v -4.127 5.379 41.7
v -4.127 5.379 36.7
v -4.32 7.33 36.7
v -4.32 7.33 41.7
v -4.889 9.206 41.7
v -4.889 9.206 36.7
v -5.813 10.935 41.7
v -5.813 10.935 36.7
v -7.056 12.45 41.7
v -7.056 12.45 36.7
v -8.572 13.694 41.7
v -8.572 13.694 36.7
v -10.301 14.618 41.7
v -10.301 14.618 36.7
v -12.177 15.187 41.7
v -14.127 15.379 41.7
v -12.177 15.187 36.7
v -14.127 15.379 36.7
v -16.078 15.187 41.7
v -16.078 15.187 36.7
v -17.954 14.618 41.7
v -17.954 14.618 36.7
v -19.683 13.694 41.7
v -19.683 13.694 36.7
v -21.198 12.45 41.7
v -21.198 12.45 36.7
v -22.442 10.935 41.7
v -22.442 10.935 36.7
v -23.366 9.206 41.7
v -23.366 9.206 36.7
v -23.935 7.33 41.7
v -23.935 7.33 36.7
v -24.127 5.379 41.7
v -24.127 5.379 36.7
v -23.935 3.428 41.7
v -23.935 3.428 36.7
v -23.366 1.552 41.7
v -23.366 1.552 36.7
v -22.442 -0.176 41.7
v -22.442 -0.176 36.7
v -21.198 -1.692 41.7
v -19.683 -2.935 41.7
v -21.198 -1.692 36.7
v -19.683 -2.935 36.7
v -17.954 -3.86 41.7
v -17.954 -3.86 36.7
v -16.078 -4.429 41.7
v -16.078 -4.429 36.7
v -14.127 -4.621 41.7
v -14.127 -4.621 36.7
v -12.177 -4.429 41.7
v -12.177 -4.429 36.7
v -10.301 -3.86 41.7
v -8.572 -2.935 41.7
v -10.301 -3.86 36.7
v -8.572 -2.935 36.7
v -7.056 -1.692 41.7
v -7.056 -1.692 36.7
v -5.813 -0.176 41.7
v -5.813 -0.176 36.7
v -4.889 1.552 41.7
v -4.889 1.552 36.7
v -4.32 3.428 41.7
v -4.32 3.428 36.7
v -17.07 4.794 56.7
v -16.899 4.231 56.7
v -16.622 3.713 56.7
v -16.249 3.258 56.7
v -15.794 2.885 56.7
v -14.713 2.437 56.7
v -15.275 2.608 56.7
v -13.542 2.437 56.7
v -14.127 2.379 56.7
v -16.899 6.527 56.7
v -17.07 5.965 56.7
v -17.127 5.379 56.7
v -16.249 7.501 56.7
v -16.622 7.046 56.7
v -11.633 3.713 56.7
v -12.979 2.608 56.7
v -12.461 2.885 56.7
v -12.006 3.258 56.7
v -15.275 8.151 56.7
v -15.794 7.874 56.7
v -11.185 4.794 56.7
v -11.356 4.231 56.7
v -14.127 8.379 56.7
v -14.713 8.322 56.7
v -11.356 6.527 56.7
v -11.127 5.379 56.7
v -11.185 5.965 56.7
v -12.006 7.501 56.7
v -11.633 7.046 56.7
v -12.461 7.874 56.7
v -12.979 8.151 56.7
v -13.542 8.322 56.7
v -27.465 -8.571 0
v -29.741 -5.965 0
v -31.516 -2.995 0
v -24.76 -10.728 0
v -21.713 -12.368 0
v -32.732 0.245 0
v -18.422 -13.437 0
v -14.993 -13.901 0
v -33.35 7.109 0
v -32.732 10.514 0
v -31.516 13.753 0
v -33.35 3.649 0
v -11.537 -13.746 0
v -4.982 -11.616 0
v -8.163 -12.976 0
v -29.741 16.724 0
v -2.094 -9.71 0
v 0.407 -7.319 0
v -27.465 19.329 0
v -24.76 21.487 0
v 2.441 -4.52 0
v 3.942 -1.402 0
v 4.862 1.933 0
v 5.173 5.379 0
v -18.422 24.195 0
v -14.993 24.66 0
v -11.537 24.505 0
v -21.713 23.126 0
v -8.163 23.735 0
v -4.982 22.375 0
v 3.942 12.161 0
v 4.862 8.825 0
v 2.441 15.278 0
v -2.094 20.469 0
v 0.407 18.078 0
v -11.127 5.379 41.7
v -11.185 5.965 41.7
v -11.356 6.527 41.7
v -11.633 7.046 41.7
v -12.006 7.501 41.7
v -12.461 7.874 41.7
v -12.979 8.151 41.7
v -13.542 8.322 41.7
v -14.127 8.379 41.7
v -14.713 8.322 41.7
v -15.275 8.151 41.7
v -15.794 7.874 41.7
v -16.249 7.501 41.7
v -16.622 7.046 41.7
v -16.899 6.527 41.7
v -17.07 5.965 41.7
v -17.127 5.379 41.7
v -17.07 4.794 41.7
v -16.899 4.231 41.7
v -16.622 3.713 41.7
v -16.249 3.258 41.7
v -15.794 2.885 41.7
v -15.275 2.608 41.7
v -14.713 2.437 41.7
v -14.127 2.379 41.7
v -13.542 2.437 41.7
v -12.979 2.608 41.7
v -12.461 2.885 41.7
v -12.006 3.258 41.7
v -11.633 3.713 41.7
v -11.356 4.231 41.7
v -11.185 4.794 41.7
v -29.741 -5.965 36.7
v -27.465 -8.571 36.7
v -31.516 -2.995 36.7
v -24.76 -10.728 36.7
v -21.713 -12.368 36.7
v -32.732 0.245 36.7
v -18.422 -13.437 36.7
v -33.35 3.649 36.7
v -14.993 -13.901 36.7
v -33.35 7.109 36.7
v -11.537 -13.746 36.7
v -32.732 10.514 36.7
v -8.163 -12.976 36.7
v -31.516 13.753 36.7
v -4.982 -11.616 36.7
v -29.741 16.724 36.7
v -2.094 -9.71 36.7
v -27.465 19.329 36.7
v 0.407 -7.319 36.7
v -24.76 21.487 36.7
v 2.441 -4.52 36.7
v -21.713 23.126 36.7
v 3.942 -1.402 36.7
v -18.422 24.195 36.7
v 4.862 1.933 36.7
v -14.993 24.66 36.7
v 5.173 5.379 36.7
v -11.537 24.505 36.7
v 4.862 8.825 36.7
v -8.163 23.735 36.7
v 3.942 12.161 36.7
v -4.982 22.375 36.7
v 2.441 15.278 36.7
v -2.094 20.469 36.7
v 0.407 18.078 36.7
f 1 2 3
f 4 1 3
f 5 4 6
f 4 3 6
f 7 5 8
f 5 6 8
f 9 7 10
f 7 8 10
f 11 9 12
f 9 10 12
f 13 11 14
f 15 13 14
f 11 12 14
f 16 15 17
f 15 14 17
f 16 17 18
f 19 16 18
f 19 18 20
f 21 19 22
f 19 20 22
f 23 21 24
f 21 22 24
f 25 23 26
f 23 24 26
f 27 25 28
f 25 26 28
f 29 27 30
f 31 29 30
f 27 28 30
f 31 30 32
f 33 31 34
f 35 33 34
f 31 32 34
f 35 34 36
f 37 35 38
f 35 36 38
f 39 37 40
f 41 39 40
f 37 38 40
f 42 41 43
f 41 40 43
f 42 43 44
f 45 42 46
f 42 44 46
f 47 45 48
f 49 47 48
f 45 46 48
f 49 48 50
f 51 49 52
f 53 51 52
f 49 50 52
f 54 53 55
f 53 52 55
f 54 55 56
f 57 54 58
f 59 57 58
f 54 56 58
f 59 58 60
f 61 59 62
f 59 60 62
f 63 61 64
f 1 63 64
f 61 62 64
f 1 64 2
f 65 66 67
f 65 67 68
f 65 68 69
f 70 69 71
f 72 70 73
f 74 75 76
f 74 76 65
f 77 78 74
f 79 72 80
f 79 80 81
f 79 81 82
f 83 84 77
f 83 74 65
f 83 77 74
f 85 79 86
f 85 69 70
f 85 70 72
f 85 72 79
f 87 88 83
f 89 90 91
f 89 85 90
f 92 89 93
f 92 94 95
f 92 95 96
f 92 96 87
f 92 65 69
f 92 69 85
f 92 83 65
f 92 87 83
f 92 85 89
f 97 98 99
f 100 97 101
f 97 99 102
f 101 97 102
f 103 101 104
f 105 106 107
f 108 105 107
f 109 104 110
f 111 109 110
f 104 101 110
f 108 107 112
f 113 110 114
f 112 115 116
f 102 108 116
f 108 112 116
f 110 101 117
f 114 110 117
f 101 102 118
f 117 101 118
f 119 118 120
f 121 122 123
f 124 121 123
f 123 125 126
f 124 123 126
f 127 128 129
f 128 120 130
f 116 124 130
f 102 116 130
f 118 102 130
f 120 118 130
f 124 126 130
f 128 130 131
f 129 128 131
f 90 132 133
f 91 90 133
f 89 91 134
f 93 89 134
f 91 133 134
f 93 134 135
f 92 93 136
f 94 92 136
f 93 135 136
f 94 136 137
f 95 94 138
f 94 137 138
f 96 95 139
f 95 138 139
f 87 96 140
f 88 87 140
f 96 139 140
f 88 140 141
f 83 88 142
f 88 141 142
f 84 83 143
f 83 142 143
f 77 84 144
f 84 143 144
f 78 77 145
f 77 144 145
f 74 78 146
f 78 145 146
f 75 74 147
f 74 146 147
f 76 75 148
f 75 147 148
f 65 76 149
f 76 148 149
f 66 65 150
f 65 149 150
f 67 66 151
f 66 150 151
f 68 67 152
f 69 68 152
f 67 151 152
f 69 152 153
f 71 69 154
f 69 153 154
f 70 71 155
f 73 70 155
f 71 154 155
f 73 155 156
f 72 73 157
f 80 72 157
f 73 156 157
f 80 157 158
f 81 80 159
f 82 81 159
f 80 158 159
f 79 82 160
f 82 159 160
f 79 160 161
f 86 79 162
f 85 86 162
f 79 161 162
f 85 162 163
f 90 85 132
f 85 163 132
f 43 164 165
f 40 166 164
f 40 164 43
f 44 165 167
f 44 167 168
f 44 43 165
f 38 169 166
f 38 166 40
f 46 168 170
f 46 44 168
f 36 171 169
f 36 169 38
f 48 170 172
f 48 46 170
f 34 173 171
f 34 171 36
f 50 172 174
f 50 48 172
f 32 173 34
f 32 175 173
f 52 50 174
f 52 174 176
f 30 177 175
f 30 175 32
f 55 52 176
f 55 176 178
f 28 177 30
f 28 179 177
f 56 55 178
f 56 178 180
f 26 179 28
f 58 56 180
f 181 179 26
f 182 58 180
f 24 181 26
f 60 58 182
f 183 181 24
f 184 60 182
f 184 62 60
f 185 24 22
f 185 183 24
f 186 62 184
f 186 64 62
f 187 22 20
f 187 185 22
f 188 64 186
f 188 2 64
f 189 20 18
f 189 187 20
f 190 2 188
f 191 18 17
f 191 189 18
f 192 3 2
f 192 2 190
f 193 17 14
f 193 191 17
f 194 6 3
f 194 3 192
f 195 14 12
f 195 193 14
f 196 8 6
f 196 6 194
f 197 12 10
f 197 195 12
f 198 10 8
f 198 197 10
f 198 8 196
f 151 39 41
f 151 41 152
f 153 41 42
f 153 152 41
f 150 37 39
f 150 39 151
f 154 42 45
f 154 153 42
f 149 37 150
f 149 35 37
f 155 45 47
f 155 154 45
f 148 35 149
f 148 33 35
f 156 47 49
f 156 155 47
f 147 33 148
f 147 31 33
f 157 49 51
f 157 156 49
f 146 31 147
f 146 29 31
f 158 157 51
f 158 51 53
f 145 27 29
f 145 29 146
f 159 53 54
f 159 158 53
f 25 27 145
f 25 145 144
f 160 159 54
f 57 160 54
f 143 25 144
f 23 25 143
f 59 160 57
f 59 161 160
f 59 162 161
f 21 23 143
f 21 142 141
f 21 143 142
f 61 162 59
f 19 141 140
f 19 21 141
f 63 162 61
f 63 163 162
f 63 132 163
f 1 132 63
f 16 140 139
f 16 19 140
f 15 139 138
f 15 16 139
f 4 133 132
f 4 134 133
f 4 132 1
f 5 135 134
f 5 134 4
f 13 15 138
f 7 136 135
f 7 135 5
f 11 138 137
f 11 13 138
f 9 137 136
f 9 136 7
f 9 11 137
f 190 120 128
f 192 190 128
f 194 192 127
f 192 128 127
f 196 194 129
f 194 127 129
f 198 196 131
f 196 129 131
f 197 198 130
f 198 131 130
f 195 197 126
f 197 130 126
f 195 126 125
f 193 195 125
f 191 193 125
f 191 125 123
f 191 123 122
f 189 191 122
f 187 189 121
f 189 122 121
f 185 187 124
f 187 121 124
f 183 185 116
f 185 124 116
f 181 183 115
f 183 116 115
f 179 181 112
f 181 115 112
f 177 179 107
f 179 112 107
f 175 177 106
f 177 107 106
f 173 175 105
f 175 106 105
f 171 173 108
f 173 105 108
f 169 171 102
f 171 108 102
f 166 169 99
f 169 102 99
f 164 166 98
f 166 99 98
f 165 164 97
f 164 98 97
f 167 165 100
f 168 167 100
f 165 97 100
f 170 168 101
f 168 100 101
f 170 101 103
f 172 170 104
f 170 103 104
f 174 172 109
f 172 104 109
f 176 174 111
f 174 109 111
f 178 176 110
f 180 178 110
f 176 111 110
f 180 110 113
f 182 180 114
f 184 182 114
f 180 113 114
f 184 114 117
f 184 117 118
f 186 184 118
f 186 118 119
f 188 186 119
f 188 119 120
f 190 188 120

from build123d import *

# Parameters (mm, degrees)
SKETCH1_R           = 19.3
BOSS_EXTRUDE1_DEPTH = 36.7
SKETCH3_R           = 10
BOSS_EXTRUDE2_DEPTH = 5
SKETCH4_R           = 3
BOSS_EXTRUDE3_DEPTH = 15


with BuildPart() as part:
    # Sketch1 → Boss-Extrude1 (new body)
    with BuildSketch(Plane.XY):
        with Locations((-14.127422454, 5.37928778)):
            Circle(SKETCH1_R)
    extrude(amount=BOSS_EXTRUDE1_DEPTH)

    # Sketch3 → Boss-Extrude2 (add)
    with BuildSketch(Plane.XY.offset(36.7)):
        with Locations((-14.127422454, 5.37928778)):
            Circle(SKETCH3_R)
    extrude(amount=BOSS_EXTRUDE2_DEPTH)

    # Sketch4 → Boss-Extrude3 (add)
    with BuildSketch(Plane.XY.offset(41.7)):
        with Locations((-14.127422454, 5.37928778)):
            Circle(SKETCH4_R)
    extrude(amount=BOSS_EXTRUDE3_DEPTH)


solid = part.part
